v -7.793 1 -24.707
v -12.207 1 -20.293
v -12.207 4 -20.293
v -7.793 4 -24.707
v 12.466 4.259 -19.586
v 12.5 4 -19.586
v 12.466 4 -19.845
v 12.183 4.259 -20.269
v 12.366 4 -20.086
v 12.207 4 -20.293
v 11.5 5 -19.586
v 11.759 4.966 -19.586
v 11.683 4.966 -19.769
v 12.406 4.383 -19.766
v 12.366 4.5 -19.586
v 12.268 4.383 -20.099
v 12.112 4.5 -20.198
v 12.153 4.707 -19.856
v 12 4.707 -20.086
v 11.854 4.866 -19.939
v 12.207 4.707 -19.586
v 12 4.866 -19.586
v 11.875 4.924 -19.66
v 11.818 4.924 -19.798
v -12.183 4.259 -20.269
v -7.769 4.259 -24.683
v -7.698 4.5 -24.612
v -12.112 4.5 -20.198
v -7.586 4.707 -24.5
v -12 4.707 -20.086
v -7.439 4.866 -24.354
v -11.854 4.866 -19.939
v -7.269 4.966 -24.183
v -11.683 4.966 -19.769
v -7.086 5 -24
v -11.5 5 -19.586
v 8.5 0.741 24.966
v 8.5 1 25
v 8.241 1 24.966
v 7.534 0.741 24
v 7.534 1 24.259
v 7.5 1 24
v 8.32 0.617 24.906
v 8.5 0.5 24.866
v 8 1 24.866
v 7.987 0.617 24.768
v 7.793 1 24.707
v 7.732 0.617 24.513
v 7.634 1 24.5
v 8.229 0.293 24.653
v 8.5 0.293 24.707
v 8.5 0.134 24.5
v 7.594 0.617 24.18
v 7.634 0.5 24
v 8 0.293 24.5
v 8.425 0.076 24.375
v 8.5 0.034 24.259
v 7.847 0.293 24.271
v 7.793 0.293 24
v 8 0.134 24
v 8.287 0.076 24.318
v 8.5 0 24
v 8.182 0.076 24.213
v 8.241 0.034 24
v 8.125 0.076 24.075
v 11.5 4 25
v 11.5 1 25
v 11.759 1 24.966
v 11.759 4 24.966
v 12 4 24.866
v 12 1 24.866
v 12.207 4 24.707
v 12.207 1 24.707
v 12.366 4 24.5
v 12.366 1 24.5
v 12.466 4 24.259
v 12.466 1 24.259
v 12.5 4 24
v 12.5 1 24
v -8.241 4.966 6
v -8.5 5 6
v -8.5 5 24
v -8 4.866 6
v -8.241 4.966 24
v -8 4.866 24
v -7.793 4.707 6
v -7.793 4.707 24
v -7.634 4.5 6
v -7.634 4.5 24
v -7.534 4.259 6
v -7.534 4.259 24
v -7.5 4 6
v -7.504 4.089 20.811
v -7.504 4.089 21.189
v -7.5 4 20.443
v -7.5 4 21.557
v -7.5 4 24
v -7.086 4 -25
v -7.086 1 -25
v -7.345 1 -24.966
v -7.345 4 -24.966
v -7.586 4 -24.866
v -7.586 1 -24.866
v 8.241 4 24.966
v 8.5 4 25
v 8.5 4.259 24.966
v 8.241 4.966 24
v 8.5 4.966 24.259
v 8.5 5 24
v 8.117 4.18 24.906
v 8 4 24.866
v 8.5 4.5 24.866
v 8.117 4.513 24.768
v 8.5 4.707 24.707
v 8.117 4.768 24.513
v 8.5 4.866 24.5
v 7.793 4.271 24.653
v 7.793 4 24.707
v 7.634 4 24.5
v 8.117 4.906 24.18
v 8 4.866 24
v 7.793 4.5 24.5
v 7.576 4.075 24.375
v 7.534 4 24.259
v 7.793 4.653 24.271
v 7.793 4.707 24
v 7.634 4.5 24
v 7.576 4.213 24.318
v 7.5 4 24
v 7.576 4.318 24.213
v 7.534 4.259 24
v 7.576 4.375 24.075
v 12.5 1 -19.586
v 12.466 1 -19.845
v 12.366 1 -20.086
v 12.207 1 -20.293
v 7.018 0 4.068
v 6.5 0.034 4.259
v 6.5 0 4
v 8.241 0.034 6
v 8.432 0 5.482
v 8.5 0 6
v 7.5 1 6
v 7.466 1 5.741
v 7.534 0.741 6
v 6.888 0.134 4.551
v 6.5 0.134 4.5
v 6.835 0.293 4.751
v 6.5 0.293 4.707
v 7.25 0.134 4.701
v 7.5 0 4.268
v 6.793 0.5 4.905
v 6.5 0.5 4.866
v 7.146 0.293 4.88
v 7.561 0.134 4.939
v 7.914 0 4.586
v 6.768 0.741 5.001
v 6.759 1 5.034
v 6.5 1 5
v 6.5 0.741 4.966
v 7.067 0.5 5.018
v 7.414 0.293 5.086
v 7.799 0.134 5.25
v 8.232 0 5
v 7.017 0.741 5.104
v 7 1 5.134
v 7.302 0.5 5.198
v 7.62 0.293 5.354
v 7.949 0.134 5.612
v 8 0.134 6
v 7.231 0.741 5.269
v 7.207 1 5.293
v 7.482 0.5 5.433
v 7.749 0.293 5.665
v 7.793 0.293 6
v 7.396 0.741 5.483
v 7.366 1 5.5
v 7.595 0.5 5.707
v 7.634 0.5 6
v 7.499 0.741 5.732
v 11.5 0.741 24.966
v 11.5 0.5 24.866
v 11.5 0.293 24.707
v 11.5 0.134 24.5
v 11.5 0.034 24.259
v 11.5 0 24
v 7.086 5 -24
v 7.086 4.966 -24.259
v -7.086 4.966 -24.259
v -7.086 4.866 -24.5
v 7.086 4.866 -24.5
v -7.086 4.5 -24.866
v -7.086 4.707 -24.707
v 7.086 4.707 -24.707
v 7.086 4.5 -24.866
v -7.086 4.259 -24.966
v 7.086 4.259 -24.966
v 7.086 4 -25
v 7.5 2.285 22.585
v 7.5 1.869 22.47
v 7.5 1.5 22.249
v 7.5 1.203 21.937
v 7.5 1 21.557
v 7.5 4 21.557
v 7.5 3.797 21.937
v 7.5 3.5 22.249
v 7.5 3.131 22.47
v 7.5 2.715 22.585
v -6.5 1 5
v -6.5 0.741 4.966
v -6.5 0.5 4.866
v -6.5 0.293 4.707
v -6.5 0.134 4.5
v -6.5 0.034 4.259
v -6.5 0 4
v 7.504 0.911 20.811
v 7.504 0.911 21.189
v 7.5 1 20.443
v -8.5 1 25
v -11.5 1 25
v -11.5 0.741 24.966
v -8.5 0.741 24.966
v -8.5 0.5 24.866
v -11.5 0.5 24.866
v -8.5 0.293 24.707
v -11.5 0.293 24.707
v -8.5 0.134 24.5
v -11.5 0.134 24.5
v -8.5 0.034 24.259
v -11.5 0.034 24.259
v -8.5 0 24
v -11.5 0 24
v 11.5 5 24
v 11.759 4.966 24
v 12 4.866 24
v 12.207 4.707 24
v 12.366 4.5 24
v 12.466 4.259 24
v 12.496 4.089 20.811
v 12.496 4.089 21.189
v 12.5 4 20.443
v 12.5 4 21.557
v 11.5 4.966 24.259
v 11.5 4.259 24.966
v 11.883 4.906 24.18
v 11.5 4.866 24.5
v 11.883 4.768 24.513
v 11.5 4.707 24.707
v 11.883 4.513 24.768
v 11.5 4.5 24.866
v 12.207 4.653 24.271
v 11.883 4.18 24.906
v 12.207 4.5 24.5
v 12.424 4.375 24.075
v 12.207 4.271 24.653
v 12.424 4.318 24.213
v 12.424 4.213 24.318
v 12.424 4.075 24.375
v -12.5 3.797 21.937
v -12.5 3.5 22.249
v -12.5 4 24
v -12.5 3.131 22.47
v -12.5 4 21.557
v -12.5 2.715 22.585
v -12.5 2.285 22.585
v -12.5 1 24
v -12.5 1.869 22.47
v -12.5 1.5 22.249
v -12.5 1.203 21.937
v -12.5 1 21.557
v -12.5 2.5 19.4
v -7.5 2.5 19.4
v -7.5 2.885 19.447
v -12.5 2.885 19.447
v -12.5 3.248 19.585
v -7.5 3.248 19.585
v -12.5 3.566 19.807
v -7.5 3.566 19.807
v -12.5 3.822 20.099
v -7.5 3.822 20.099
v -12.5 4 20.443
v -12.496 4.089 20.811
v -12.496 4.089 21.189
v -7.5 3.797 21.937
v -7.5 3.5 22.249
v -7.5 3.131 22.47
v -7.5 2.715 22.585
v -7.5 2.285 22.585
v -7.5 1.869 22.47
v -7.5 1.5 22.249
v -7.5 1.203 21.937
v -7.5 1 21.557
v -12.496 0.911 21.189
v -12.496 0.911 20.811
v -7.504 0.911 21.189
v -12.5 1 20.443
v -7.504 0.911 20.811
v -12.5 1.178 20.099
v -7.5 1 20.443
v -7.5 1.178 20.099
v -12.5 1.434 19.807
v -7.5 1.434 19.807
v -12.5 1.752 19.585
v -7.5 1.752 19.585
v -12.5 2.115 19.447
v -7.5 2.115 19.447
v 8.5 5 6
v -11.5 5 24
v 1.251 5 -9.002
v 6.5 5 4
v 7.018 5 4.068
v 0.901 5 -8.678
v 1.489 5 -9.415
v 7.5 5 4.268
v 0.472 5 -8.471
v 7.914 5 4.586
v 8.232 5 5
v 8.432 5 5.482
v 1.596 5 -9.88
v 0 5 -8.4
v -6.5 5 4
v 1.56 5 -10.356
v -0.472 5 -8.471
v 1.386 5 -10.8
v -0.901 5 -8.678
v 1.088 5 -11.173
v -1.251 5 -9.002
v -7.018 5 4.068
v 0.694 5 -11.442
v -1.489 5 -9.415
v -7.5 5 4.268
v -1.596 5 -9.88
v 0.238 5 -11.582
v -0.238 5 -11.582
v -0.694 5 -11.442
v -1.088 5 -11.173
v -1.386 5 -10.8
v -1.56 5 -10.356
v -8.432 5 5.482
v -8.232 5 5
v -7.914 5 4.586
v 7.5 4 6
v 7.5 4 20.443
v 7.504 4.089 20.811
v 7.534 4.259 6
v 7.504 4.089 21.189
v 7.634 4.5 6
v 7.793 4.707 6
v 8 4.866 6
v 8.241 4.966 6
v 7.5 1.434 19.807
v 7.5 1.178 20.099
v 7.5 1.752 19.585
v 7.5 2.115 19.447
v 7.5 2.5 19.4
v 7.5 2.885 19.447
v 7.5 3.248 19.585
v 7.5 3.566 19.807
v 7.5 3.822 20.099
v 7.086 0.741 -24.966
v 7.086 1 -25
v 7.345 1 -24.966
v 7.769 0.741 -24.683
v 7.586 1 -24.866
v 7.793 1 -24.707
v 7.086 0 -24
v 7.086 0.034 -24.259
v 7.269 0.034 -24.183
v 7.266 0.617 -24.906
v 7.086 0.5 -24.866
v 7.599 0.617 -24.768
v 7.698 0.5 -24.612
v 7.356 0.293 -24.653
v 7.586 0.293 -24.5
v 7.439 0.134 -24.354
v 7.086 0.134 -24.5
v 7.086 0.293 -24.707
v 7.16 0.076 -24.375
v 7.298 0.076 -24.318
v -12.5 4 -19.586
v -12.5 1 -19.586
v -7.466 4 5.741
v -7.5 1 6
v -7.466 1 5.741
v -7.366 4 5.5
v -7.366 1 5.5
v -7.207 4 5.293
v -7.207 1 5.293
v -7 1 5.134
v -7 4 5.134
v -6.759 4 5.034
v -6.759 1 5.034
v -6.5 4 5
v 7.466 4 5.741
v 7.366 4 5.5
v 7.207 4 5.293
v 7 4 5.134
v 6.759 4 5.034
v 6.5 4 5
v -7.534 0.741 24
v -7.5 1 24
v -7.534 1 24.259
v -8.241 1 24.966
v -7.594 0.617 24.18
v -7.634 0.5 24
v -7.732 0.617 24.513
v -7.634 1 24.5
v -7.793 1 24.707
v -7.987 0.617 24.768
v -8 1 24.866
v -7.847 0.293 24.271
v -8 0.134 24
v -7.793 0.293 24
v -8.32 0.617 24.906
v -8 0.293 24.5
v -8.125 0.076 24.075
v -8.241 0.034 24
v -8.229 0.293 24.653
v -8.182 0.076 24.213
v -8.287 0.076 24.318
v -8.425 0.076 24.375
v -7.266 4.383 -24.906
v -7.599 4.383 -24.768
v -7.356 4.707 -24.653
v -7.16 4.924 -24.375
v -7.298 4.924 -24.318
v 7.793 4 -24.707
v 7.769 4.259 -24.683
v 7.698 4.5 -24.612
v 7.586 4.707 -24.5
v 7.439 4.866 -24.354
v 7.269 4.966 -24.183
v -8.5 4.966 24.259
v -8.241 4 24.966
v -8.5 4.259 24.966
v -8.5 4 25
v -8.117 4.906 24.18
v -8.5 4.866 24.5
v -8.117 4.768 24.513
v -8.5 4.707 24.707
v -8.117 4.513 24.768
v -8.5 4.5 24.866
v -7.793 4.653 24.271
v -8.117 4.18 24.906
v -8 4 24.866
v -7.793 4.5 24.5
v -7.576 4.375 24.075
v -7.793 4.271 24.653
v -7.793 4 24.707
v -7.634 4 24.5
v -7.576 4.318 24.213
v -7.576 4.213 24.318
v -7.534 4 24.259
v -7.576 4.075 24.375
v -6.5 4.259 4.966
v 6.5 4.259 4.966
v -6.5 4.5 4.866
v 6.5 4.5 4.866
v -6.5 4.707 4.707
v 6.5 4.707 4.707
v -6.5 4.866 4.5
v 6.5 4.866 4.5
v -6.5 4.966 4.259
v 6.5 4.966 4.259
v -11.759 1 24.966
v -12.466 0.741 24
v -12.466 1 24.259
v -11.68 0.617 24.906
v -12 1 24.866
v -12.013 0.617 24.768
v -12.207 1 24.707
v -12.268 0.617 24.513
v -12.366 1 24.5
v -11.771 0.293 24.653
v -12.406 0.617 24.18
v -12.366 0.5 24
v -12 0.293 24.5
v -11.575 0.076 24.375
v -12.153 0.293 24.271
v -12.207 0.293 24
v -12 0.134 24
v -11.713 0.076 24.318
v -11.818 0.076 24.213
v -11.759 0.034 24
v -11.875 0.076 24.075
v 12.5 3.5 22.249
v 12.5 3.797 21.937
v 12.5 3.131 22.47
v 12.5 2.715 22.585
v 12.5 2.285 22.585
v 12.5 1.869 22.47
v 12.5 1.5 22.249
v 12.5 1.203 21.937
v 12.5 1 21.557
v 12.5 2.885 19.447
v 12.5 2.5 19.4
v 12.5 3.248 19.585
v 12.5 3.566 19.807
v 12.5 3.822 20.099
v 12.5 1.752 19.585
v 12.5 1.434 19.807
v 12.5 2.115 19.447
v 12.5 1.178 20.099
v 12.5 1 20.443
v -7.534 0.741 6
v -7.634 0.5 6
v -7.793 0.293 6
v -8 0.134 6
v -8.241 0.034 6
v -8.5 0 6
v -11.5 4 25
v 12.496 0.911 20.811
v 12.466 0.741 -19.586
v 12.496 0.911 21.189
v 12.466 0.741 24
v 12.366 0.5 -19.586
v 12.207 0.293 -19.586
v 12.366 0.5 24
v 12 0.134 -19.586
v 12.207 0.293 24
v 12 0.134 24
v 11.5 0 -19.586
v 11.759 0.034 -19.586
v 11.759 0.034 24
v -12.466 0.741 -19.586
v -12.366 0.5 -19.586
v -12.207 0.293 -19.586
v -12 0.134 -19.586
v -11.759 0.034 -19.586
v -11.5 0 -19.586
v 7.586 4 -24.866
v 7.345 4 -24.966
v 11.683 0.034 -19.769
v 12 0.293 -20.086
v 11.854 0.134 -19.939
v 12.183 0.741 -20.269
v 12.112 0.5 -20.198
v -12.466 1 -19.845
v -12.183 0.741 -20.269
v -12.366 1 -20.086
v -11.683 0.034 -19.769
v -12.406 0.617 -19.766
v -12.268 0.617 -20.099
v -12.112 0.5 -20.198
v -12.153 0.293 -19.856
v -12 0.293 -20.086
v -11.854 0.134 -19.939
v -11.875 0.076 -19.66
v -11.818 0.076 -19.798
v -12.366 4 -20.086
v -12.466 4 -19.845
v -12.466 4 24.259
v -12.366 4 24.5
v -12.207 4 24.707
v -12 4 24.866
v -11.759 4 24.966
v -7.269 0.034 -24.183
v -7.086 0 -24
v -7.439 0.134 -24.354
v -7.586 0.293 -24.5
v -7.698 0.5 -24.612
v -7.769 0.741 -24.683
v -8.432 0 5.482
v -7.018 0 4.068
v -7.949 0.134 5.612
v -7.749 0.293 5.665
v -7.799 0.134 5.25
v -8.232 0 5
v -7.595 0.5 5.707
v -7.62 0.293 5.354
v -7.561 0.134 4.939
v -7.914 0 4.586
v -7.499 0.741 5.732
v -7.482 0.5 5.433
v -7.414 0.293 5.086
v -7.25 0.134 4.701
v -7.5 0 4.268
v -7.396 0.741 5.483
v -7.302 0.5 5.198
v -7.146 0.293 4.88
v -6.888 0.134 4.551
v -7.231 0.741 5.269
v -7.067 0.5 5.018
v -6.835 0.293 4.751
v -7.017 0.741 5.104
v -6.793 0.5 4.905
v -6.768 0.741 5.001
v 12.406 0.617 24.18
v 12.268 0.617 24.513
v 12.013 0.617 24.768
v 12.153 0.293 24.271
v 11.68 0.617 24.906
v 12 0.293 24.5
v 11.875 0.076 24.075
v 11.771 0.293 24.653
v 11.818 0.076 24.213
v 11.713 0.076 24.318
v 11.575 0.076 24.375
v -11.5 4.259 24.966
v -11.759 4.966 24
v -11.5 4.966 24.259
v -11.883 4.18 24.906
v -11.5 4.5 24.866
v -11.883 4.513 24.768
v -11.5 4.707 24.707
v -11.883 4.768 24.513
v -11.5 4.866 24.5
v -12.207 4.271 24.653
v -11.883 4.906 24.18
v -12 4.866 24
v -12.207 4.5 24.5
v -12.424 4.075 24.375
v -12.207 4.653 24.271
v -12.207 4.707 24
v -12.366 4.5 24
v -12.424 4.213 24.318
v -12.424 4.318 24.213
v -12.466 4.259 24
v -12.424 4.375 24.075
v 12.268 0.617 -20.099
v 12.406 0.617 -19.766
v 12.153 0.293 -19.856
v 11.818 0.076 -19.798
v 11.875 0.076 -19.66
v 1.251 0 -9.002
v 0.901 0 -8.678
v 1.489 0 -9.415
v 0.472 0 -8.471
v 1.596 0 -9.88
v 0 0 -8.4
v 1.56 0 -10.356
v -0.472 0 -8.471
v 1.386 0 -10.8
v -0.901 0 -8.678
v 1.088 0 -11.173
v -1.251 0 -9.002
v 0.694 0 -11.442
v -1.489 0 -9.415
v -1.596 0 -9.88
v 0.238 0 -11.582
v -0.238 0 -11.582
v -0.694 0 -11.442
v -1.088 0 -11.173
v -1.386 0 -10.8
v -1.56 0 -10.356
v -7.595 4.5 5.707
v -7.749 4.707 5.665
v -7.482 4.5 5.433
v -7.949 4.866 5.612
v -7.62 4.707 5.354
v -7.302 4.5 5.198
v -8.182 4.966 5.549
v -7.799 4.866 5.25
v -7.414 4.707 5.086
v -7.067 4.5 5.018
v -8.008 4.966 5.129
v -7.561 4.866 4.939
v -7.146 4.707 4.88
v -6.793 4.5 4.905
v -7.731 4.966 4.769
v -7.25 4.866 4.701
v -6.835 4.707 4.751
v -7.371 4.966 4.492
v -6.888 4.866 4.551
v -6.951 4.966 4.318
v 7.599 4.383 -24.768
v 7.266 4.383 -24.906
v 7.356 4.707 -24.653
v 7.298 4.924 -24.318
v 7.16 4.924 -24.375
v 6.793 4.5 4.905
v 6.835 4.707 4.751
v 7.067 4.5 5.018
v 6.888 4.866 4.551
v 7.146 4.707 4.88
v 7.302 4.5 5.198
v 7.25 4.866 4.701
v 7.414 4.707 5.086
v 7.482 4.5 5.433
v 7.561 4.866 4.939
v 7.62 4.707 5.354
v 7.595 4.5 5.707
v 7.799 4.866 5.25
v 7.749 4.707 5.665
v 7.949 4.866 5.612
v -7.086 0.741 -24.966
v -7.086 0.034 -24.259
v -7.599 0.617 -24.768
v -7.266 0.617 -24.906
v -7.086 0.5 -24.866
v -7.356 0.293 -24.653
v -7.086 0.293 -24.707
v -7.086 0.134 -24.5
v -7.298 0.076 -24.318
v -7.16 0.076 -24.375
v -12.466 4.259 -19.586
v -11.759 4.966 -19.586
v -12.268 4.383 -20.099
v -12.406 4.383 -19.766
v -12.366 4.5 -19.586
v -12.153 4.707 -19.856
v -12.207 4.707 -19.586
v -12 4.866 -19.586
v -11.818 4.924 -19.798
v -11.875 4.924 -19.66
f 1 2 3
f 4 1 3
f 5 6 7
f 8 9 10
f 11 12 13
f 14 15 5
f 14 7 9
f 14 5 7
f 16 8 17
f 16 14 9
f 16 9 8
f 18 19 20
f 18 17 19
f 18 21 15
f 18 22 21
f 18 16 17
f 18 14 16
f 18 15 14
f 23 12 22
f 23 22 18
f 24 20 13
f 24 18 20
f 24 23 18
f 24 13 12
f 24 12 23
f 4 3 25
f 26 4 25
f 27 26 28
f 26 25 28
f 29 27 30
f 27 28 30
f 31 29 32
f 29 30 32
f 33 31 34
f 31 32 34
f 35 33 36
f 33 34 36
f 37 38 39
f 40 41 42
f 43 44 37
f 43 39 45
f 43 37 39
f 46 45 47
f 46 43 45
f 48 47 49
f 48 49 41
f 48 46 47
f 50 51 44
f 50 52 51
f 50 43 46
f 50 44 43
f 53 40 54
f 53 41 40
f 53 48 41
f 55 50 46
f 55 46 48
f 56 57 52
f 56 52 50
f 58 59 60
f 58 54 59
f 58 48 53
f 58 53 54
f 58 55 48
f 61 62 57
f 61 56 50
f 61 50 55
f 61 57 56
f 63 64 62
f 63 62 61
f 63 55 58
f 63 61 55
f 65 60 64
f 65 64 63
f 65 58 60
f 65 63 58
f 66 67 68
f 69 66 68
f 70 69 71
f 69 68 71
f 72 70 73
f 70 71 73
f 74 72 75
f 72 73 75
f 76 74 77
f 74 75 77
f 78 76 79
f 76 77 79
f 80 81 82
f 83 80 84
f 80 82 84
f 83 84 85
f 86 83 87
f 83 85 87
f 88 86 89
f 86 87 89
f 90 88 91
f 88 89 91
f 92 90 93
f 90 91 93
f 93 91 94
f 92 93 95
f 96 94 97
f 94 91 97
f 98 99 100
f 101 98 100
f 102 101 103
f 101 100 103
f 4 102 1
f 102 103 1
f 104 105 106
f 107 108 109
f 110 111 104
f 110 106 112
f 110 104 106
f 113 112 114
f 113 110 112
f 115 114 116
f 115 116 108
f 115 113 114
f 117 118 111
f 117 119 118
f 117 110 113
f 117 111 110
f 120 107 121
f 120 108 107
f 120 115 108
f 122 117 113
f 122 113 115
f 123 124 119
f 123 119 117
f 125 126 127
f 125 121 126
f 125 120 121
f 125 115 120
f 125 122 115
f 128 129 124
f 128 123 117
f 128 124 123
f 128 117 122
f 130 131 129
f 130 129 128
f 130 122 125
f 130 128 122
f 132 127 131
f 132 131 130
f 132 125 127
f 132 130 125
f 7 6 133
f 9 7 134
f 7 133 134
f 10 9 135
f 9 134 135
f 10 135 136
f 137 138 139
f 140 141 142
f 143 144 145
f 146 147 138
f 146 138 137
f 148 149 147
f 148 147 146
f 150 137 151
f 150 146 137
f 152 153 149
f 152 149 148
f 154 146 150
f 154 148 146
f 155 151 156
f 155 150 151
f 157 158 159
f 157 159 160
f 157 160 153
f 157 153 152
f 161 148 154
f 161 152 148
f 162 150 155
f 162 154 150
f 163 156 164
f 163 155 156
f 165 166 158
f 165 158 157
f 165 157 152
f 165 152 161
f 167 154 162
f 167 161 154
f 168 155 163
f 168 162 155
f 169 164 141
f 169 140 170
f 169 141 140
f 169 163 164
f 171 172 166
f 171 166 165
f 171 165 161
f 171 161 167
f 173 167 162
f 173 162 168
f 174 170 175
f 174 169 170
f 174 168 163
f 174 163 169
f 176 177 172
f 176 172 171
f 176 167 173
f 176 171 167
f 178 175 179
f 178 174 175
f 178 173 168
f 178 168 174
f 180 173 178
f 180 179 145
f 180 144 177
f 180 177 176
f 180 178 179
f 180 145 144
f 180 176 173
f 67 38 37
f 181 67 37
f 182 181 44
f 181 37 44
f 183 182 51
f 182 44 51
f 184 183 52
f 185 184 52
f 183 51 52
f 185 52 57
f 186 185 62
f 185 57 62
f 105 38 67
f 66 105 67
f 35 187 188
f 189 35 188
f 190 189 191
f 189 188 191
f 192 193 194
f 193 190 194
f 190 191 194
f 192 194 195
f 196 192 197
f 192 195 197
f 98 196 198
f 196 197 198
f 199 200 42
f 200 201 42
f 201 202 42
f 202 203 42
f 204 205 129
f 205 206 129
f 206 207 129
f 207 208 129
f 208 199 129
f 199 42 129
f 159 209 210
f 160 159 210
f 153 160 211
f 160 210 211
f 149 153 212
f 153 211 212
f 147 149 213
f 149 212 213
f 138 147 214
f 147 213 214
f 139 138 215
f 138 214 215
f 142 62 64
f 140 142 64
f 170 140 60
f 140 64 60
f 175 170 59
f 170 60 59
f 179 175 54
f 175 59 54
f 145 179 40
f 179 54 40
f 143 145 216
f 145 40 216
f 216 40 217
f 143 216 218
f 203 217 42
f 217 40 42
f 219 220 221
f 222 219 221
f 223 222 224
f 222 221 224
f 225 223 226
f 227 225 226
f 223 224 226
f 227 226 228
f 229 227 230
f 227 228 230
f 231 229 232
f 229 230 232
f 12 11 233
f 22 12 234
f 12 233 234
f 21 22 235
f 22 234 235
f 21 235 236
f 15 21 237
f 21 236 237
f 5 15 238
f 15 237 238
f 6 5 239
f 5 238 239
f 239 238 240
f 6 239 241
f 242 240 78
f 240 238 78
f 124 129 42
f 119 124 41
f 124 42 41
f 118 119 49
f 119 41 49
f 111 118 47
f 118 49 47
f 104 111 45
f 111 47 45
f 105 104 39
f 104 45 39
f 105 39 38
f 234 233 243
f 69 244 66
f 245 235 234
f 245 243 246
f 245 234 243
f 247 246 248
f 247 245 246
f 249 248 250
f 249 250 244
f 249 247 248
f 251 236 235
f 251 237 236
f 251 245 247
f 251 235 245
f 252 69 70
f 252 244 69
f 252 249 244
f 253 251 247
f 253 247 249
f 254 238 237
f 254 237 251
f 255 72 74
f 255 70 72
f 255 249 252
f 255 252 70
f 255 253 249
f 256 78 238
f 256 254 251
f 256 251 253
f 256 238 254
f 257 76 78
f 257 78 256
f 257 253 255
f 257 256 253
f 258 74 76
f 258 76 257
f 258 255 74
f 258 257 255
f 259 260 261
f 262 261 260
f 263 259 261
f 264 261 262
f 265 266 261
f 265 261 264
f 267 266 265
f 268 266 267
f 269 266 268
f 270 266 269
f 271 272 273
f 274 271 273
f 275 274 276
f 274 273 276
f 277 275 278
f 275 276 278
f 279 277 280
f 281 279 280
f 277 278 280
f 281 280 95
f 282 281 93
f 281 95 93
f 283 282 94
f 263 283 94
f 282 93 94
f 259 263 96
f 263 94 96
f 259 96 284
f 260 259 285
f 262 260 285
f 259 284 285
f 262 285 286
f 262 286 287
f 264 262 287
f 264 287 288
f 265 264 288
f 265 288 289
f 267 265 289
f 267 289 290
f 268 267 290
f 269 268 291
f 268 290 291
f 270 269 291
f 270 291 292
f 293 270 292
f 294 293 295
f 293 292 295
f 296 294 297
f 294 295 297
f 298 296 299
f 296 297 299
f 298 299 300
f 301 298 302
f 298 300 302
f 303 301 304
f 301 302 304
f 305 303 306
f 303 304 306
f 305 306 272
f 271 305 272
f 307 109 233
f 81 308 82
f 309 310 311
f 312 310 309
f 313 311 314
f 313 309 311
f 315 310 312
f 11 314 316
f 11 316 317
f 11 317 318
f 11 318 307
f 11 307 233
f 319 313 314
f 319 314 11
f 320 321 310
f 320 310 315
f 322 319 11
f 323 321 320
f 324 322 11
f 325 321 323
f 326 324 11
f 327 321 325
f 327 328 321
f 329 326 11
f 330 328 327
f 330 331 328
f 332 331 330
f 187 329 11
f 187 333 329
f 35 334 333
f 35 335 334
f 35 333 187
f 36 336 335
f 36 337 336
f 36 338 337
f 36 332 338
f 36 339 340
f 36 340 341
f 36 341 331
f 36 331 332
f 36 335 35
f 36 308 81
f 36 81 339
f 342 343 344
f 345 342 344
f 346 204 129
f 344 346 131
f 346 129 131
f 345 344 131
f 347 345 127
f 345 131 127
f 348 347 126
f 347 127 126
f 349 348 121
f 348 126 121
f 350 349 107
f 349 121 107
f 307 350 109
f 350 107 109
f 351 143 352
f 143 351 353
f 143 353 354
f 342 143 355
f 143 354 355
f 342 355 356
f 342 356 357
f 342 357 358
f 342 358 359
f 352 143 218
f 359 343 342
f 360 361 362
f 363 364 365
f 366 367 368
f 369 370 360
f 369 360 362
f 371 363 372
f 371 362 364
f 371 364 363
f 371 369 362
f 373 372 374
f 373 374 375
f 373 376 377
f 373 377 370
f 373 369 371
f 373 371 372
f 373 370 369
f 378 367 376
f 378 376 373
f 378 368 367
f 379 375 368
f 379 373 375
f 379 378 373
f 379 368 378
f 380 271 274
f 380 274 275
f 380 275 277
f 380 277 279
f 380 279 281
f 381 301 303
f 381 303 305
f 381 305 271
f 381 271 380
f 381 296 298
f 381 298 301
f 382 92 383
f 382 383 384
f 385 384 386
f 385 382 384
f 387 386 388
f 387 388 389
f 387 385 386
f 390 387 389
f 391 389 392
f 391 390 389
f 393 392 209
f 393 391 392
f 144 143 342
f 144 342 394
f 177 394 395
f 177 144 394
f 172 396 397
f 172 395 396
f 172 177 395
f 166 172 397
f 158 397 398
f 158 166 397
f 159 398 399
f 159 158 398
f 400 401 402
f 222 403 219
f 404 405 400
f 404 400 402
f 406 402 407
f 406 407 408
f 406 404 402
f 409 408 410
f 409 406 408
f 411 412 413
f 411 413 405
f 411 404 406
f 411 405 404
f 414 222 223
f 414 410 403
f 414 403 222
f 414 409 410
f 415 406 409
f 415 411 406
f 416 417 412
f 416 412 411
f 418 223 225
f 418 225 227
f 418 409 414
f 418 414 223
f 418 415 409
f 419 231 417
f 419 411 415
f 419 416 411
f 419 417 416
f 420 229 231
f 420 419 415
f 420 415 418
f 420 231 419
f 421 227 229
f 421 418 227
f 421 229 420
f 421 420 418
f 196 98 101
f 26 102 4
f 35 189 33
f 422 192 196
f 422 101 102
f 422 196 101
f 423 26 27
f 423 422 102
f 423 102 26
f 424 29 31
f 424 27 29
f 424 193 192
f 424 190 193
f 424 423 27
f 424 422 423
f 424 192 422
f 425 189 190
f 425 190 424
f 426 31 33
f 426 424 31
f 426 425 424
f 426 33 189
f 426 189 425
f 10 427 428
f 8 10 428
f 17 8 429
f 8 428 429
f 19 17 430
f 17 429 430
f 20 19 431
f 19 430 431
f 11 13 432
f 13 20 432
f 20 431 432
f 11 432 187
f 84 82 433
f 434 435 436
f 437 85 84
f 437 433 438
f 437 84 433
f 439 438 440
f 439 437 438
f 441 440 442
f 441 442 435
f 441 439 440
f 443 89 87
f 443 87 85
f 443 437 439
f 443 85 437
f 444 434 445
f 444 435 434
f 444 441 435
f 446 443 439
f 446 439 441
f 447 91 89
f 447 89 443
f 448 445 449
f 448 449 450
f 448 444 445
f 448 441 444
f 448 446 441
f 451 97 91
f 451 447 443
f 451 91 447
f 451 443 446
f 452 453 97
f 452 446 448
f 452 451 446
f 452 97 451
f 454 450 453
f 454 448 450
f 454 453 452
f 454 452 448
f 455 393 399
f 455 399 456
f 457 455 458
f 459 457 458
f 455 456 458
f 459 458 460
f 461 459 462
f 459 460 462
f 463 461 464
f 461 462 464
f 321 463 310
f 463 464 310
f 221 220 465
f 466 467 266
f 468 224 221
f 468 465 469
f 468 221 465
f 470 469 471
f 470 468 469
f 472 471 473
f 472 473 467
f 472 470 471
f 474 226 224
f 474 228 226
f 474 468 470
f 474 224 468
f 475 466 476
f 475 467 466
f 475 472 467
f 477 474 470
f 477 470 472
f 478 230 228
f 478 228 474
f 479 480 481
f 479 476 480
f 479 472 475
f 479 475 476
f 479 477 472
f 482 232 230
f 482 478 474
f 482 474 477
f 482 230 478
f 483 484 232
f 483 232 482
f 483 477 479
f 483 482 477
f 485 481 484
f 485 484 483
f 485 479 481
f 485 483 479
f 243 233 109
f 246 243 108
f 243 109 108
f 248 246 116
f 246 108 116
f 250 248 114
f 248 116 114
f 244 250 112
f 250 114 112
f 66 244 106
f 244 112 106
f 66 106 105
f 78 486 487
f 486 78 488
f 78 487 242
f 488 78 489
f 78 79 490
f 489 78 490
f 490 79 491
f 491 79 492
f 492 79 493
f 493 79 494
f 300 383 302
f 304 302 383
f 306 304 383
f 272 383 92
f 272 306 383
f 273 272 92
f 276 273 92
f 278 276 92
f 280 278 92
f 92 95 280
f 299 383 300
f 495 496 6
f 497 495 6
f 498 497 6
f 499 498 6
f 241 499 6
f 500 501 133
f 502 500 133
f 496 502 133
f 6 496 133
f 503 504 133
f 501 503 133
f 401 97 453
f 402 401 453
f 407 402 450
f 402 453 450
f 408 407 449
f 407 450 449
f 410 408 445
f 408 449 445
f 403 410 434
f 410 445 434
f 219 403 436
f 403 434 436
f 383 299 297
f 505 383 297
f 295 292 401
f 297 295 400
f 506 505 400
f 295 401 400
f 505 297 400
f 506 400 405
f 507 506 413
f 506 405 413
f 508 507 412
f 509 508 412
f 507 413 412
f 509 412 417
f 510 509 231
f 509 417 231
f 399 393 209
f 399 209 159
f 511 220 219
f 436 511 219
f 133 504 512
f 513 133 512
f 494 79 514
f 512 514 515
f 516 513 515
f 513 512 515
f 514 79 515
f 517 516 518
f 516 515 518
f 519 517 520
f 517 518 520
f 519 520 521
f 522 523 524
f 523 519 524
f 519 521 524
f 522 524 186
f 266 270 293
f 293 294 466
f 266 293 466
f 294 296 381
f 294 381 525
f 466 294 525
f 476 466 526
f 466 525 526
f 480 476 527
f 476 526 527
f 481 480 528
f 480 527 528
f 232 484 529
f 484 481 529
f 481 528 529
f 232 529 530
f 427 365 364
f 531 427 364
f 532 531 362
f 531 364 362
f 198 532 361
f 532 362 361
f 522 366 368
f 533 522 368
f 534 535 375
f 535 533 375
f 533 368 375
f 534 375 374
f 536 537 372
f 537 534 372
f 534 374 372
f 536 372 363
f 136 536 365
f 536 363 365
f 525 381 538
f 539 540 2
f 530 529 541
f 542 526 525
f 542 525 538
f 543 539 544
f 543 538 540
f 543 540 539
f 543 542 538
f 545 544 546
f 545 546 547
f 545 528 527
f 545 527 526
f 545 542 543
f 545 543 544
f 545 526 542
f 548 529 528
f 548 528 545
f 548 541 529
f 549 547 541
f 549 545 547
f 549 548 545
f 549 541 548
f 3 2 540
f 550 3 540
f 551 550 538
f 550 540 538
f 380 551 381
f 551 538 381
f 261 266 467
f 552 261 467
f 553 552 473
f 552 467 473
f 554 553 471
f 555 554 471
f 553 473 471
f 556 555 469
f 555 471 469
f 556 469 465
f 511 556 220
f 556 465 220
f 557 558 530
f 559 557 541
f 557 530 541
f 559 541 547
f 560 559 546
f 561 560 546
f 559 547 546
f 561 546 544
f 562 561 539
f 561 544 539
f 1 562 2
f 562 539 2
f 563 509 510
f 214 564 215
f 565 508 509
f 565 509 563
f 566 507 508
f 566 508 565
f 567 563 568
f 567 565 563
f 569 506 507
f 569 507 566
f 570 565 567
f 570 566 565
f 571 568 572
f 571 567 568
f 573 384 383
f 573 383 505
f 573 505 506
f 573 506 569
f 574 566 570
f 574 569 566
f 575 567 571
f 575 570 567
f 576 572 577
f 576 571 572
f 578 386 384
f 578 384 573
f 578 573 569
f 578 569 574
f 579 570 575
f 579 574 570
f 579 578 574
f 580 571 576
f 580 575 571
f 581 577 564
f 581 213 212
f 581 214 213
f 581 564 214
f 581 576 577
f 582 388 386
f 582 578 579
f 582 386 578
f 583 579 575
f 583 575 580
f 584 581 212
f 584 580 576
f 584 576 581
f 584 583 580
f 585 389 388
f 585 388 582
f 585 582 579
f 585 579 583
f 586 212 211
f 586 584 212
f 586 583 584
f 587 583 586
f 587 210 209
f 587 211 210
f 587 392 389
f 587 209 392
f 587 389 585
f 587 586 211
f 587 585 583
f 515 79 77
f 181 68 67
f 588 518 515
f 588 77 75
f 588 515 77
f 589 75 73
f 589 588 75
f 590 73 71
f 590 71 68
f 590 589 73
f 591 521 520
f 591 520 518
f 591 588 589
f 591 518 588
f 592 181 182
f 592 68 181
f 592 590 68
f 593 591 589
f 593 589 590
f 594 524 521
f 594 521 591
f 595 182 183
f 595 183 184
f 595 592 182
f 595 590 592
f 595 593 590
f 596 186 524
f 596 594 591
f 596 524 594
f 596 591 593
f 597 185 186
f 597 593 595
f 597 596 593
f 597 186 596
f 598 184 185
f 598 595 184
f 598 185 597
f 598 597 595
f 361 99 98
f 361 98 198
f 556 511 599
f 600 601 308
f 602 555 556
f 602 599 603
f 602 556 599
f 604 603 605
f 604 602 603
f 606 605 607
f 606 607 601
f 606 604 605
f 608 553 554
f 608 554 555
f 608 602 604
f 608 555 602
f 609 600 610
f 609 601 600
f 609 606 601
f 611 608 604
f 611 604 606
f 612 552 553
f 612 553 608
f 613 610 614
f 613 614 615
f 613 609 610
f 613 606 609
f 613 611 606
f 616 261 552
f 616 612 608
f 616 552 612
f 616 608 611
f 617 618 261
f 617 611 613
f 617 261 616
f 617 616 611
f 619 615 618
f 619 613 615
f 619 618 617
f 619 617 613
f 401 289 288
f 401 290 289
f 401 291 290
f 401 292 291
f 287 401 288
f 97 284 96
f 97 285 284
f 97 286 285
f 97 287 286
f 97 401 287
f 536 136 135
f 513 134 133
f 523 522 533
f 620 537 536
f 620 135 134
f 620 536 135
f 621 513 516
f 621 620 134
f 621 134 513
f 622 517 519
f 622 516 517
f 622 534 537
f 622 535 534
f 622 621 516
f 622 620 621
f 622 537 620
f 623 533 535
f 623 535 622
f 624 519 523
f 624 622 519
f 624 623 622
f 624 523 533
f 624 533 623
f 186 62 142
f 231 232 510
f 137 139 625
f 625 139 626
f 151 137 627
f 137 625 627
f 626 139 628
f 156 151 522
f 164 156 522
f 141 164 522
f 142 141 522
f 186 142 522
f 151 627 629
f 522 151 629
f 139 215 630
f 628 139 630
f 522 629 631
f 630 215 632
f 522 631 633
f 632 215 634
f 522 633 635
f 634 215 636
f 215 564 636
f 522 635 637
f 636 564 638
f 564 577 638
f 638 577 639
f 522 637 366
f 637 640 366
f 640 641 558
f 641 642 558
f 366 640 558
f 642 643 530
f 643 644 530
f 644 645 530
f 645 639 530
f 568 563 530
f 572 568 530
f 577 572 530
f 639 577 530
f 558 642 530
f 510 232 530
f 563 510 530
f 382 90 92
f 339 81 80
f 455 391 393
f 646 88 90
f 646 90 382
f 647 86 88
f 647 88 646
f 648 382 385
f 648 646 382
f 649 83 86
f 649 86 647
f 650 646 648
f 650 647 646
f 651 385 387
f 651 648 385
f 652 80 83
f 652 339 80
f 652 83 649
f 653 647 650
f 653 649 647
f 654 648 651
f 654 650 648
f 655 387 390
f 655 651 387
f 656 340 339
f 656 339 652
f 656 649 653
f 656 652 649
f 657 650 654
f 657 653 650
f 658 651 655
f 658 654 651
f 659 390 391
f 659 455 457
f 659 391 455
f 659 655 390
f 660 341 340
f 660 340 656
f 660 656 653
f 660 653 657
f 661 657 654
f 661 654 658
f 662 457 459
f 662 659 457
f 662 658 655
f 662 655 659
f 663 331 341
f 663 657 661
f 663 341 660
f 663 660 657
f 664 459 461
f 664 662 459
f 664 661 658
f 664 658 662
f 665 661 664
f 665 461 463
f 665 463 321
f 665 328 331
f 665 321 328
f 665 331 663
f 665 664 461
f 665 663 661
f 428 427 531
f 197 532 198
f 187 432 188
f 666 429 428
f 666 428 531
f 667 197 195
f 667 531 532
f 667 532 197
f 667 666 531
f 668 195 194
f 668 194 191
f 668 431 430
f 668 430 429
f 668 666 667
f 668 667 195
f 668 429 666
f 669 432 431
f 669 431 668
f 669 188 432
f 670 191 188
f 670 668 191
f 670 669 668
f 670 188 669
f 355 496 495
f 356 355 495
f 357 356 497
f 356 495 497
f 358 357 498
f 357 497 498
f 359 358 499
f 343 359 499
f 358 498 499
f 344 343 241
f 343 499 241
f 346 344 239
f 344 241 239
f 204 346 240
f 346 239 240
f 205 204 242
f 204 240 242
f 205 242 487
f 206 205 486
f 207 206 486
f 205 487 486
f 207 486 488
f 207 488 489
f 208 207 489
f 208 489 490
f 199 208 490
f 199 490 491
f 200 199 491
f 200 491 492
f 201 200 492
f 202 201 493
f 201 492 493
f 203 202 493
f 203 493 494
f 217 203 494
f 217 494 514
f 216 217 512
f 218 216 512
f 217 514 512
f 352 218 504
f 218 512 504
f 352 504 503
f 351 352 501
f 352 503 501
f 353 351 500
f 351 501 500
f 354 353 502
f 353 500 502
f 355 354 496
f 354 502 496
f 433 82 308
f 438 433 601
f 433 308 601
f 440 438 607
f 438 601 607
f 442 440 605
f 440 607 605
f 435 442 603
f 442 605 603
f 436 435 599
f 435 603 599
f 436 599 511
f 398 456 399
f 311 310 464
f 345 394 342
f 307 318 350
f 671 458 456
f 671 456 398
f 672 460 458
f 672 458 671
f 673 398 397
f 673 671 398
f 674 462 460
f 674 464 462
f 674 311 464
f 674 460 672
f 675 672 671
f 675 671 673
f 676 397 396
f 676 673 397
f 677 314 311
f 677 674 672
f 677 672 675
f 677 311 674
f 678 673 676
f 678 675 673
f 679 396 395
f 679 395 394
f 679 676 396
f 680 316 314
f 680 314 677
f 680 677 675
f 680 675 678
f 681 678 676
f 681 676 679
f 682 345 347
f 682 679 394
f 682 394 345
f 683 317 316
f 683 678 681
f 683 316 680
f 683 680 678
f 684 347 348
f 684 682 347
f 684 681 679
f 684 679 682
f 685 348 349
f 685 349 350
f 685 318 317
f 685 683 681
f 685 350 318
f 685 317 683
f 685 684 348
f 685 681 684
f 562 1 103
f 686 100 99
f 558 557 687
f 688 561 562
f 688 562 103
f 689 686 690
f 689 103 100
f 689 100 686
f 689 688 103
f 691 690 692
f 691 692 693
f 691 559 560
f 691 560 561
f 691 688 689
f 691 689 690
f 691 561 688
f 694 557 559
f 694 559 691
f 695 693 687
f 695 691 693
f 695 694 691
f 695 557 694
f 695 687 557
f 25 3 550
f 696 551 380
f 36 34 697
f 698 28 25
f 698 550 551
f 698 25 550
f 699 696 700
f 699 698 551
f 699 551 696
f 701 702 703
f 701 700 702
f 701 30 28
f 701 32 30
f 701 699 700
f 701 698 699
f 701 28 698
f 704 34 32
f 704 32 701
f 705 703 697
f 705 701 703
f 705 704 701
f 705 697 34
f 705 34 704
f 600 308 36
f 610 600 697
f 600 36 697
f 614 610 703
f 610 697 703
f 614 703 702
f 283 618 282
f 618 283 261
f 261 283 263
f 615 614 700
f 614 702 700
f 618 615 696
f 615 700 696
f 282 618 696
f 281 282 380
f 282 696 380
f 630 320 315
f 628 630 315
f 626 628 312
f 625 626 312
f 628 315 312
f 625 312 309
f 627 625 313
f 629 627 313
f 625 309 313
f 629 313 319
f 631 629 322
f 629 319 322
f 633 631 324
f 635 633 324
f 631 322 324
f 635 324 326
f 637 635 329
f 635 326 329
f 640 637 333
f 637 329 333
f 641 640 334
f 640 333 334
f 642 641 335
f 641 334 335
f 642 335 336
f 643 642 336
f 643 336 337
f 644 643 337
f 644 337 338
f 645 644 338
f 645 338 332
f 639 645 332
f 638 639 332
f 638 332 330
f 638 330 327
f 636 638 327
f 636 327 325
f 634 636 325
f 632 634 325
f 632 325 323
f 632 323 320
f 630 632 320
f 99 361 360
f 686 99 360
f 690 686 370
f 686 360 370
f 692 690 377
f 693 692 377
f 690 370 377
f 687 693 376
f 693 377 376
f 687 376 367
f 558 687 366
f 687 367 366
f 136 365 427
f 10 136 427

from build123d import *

# Parameters (mm, degrees)
SKETCH1_W           = 25
SKETCH1_H           = 50
BOSS_EXTRUDE1_DEPTH = 5
SKETCH3_W           = 15
SKETCH3_H           = 5
CUT_EXTRUDE1_DEPTH  = 20
SKETCH5_R           = 1.6
CUT_EXTRUDE4_DEPTH  = 48.5
SKETCH6_R           = 1.6
CUT_EXTRUDE5_DEPTH  = 48.5
CHAMFER1_SIZE       = 5
FILLET1_R           = 1


with BuildPart() as part:
    # Sketch1 → Boss-Extrude1 (new body)
    with BuildSketch(Plane(origin=(0, 0, 0), x_dir=(1, 0, 0), z_dir=(0, 1, 0))):
        Rectangle(SKETCH1_W, SKETCH1_H)
    extrude(amount=BOSS_EXTRUDE1_DEPTH)

    # Sketch3 → Cut-Extrude1 (cut)
    with BuildSketch(Plane.XY.offset(25)):
        with Locations((0, 2.5)):
            Rectangle(SKETCH3_W, SKETCH3_H)
    extrude(amount=-CUT_EXTRUDE1_DEPTH, mode=Mode.SUBTRACT)

    # Sketch5 → Cut-Extrude4 (cut)
    with BuildSketch(Plane(origin=(12.5, 0, 0), x_dir=(0, 0, -1), z_dir=(1, 0, 0))):
        with Locations((-21, 2.5)):
            Circle(SKETCH5_R)
    extrude(amount=-CUT_EXTRUDE4_DEPTH, mode=Mode.SUBTRACT)

    # Sketch6 → Cut-Extrude5 (cut)
    with BuildSketch(Plane(origin=(0, 5, 0), x_dir=(1, 0, 0), z_dir=(0, 1, 0))):
        with Locations(Location((0, 10, 0), (0, 0, 270))):
            Circle(SKETCH6_R)
    extrude(amount=-CUT_EXTRUDE5_DEPTH, mode=Mode.SUBTRACT)

    # Chamfer1
    chamfer1_edges = [part.edges().sort_by_distance(p)[0] for p in [
        (-12.5, 2.5, -25),
        (12.5, 2.5, -25),
    ]]
    chamfer(chamfer1_edges, length=CHAMFER1_SIZE)

    # Fillet1
    # the kernel refuses this fillet: 1 mm, written as the material it adds along each edge
    with BuildSketch(Plane(origin=(7.5, 0, 5), x_dir=(-1, 0, 0), z_dir=(0, 1, 0))) as fillet1_piece_1:
        with BuildLine():
            CenterArc((FILLET1_R, FILLET1_R), FILLET1_R, 180, 90)
            Line((0, FILLET1_R), (0, 0))
            Line((0, 0), (FILLET1_R, 0))
        make_face()
    extrude(amount=5)
    with BuildSketch(Plane(origin=(-7.5, 5, 5), x_dir=(0, 0, 1), z_dir=(0, -1, 0))) as fillet1_piece_2:
        with BuildLine():
            CenterArc((FILLET1_R, -FILLET1_R), FILLET1_R, 90, 90)
            Line((0, -FILLET1_R), (0, 0))
            Line((0, 0), (FILLET1_R, 0))
        make_face()
    extrude(amount=5)
    # the kernel refuses this fillet: 1 mm, written as the material it takes off along each edge
    with BuildSketch(Plane(origin=(11.5, 1, 24), x_dir=(1, 0, 0), z_dir=(0, -1, 0))) as fillet1_2_piece_1_section:
        Polygon((0, 0), (FILLET1_R, 0), (FILLET1_R, FILLET1_R), (0, FILLET1_R), align=None)
    fillet1_2_piece_1 = extrude(amount=FILLET1_R, mode=Mode.PRIVATE)
    fillet1_2_piece_1 = fillet1_2_piece_1 - Plane(origin=(11.5, 1, 24), x_dir=(-0.7071067811865475, 0, -0.7071067811865475), z_dir=(0, -1, 0)) * Sphere(FILLET1_R, mode=Mode.PRIVATE)
    add(fillet1_2_piece_1, mode=Mode.SUBTRACT)
    with BuildSketch(Plane(origin=(-11.5, 4, 24), x_dir=(0, 0, 1), z_dir=(-1, 0, 0))) as fillet1_2_piece_2_section:
        Polygon((0, 0), (FILLET1_R, 0), (FILLET1_R, FILLET1_R), (0, FILLET1_R), align=None)
    fillet1_2_piece_2 = extrude(amount=FILLET1_R, mode=Mode.PRIVATE)
    fillet1_2_piece_2 = fillet1_2_piece_2 - Plane(origin=(-11.5, 4, 24), x_dir=(0, -0.7071067811865475, -0.7071067811865475), z_dir=(-1, 0, 0)) * Sphere(FILLET1_R, mode=Mode.PRIVATE)
    add(fillet1_2_piece_2, mode=Mode.SUBTRACT)
    with BuildSketch(Plane(origin=(11.5, 4, 24), x_dir=(0, 0, 1), z_dir=(1, 0, 0))) as fillet1_2_piece_3_section:
        Polygon((0, 0), (FILLET1_R, 0), (FILLET1_R, -FILLET1_R), (0, -FILLET1_R), align=None)
    fillet1_2_piece_3 = extrude(amount=FILLET1_R, mode=Mode.PRIVATE)
    fillet1_2_piece_3 = fillet1_2_piece_3 - Plane(origin=(11.5, 4, 24), x_dir=(0, -0.7071067811865475, -0.7071067811865475), z_dir=(1, 0, 0)) * Sphere(FILLET1_R, mode=Mode.PRIVATE)
    add(fillet1_2_piece_3, mode=Mode.SUBTRACT)
    with BuildSketch(Plane(origin=(-11.5, 1, -19.585786438), x_dir=(-1, 0, 0), z_dir=(0, -1, 0))) as fillet1_2_piece_4_section:
        Polygon((0, 0), (FILLET1_R, 0), (FILLET1_R, FILLET1_R * 0.414213562373), (FILLET1_R * 0.707106781187, FILLET1_R * 0.707106781187), align=None)
    fillet1_2_piece_4 = extrude(amount=FILLET1_R, mode=Mode.PRIVATE)
    fillet1_2_piece_4 = fillet1_2_piece_4 - Plane(origin=(-11.5, 1, -19.585786438), x_dir=(0.9238795325112867, 0, 0.3826834323650898), z_dir=(0, -1, 0)) * Sphere(FILLET1_R, mode=Mode.PRIVATE)
    add(fillet1_2_piece_4, mode=Mode.SUBTRACT)
    with BuildSketch(Plane(origin=(-11.5, 1, 24), x_dir=(-1, 0, 0), z_dir=(0, -1, 0))) as fillet1_2_piece_5_section:
        Polygon((0, 0), (FILLET1_R, 0), (FILLET1_R, -FILLET1_R), (0, -FILLET1_R), align=None)
    fillet1_2_piece_5 = extrude(amount=FILLET1_R, mode=Mode.PRIVATE)
    fillet1_2_piece_5 = fillet1_2_piece_5 - Plane(origin=(-11.5, 1, 24), x_dir=(0.7071067811865475, 0, -0.7071067811865475), z_dir=(0, -1, 0)) * Sphere(FILLET1_R, mode=Mode.PRIVATE)
    add(fillet1_2_piece_5, mode=Mode.SUBTRACT)
    with BuildSketch(Plane(origin=(-11.5, 4, -19.585786438), x_dir=(-1, 0, 0), z_dir=(0, 1, 0))) as fillet1_2_piece_6_section:
        Polygon((0, 0), (FILLET1_R, 0), (FILLET1_R, -FILLET1_R * 0.414213562373), (FILLET1_R * 0.707106781187, -FILLET1_R * 0.707106781187), align=None)
    fillet1_2_piece_6 = extrude(amount=FILLET1_R, mode=Mode.PRIVATE)
    fillet1_2_piece_6 = fillet1_2_piece_6 - Plane(origin=(-11.5, 4, -19.585786438), x_dir=(0.9238795325112867, 0, 0.3826834323650898), z_dir=(0, 1, 0)) * Sphere(FILLET1_R, mode=Mode.PRIVATE)
    add(fillet1_2_piece_6, mode=Mode.SUBTRACT)
    with BuildSketch(Plane(origin=(7.085786438, 1, -24), x_dir=(0, 0, -1), z_dir=(0, -1, 0))) as fillet1_2_piece_7_section:
        Polygon((0, 0), (FILLET1_R, 0), (FILLET1_R, FILLET1_R * 0.414213562373), (FILLET1_R * 0.707106781187, FILLET1_R * 0.707106781187), align=None)
    fillet1_2_piece_7 = extrude(amount=FILLET1_R, mode=Mode.PRIVATE)
    fillet1_2_piece_7 = fillet1_2_piece_7 - Plane(origin=(7.085786438, 1, -24), x_dir=(-0.3826834323650898, 0, 0.9238795325112867), z_dir=(0, -1, 0)) * Sphere(FILLET1_R, mode=Mode.PRIVATE)
    add(fillet1_2_piece_7, mode=Mode.SUBTRACT)
    with BuildSketch(Plane(origin=(-7.085786438, 1, -24), x_dir=(-0.7071067811865476, 0, -0.7071067811865476), z_dir=(0, -1, 0))) as fillet1_2_piece_8_section:
        Polygon((0, 0), (FILLET1_R, 0), (FILLET1_R, FILLET1_R * 0.414213562373), (FILLET1_R * 0.707106781187, FILLET1_R * 0.707106781187), align=None)
    fillet1_2_piece_8 = extrude(amount=FILLET1_R, mode=Mode.PRIVATE)
    fillet1_2_piece_8 = fillet1_2_piece_8 - Plane(origin=(-7.085786438, 1, -24), x_dir=(0.3826834323650898, 0, 0.9238795325112867), z_dir=(0, -1, 0)) * Sphere(FILLET1_R, mode=Mode.PRIVATE)
    add(fillet1_2_piece_8, mode=Mode.SUBTRACT)
    with BuildSketch(Plane(origin=(11.5, 4, -19.585786438), x_dir=(0.7071067811865476, 0, -0.7071067811865476), z_dir=(0, 1, 0))) as fillet1_2_piece_9_section:
        Polygon((0, 0), (FILLET1_R, 0), (FILLET1_R, -FILLET1_R * 0.414213562373), (FILLET1_R * 0.707106781187, -FILLET1_R * 0.707106781187), align=None)
    fillet1_2_piece_9 = extrude(amount=FILLET1_R, mode=Mode.PRIVATE)
    fillet1_2_piece_9 = fillet1_2_piece_9 - Plane(origin=(11.5, 4, -19.585786438), x_dir=(-0.9238795325112867, 0, 0.3826834323650898), z_dir=(0, 1, 0)) * Sphere(FILLET1_R, mode=Mode.PRIVATE)
    add(fillet1_2_piece_9, mode=Mode.SUBTRACT)
    with BuildSketch(Plane(origin=(11.5, 1, -19.585786438), x_dir=(1, 0, 0), z_dir=(0, -1, 0))) as fillet1_2_piece_10_section:
        Polygon((0, 0), (FILLET1_R, 0), (FILLET1_R, -FILLET1_R * 0.414213562373), (FILLET1_R * 0.707106781187, -FILLET1_R * 0.707106781187), align=None)
    fillet1_2_piece_10 = extrude(amount=FILLET1_R, mode=Mode.PRIVATE)
    fillet1_2_piece_10 = fillet1_2_piece_10 - Plane(origin=(11.5, 1, -19.585786438), x_dir=(-0.9238795325112867, 0, 0.3826834323650898), z_dir=(0, -1, 0)) * Sphere(FILLET1_R, mode=Mode.PRIVATE)
    add(fillet1_2_piece_10, mode=Mode.SUBTRACT)
    with BuildSketch(Plane(origin=(7.085786438, 4, -24), x_dir=(0.7071067811865476, 0, -0.7071067811865476), z_dir=(0, 1, 0))) as fillet1_2_piece_11_section:
        Polygon((0, 0), (FILLET1_R, 0), (FILLET1_R, FILLET1_R * 0.414213562373), (FILLET1_R * 0.707106781187, FILLET1_R * 0.707106781187), align=None)
    fillet1_2_piece_11 = extrude(amount=FILLET1_R, mode=Mode.PRIVATE)
    fillet1_2_piece_11 = fillet1_2_piece_11 - Plane(origin=(7.085786438, 4, -24), x_dir=(-0.3826834323650898, 0, 0.9238795325112867), z_dir=(0, 1, 0)) * Sphere(FILLET1_R, mode=Mode.PRIVATE)
    add(fillet1_2_piece_11, mode=Mode.SUBTRACT)
    with BuildSketch(Plane(origin=(-7.085786438, 4, -24), x_dir=(-0.7071067811865476, 0, -0.7071067811865476), z_dir=(0, 1, 0))) as fillet1_2_piece_12_section:
        Polygon((0, 0), (FILLET1_R, 0), (FILLET1_R, -FILLET1_R * 0.414213562373), (FILLET1_R * 0.707106781187, -FILLET1_R * 0.707106781187), align=None)
    fillet1_2_piece_12 = extrude(amount=FILLET1_R, mode=Mode.PRIVATE)
    fillet1_2_piece_12 = fillet1_2_piece_12 - Plane(origin=(-7.085786438, 4, -24), x_dir=(0.3826834323650898, 0, 0.9238795325112867), z_dir=(0, 1, 0)) * Sphere(FILLET1_R, mode=Mode.PRIVATE)
    add(fillet1_2_piece_12, mode=Mode.SUBTRACT)
    with BuildSketch(Plane(origin=(5, 0, 25), x_dir=(0, 0, -1), z_dir=(1, 0, 0)), Plane(origin=(-11.5, 5, 25), x_dir=(0, -1, 0), z_dir=(1, 0, 0)), Plane(origin=(5, 5, 25), x_dir=(0, -1, 0), z_dir=(1, 0, 0)), Plane(origin=(-11.5, 0, 25), x_dir=(0, 0, -1), z_dir=(1, 0, 0))) as fillet1_2_piece_13:
        with BuildLine():
            CenterArc((FILLET1_R, FILLET1_R), FILLET1_R, 180, 90)
            Line((0, FILLET1_R), (0, 0))
            Line((0, 0), (FILLET1_R, 0))
        make_face()
    extrude(amount=6.5, mode=Mode.SUBTRACT)
    with BuildSketch(Plane(origin=(-7.5, 7.5, 25), x_dir=(-1, 0, 0), z_dir=(0, -1, 0))) as fillet1_2_piece_14:
        with BuildLine():
            CenterArc((FILLET1_R, FILLET1_R), FILLET1_R, 180, 90)
            Line((0, FILLET1_R), (0, 0))
            Line((0, 0), (FILLET1_R, 0))
        make_face()
    extrude(amount=10, mode=Mode.SUBTRACT)
    with BuildSketch(Plane(origin=(7.5, -2.5, 25), x_dir=(0, 0, -1), z_dir=(0, 1, 0))) as fillet1_2_piece_15:
        with BuildLine():
            CenterArc((FILLET1_R, -FILLET1_R), FILLET1_R, 90, 90)
            Line((0, -FILLET1_R), (0, 0))
            Line((0, 0), (FILLET1_R, 0))
        make_face()
    extrude(amount=10, mode=Mode.SUBTRACT)
    with BuildSketch(Plane(origin=(-12.5, 0, -19.585786438), x_dir=(1, 0, 0), z_dir=(0, 0, 1)), Plane(origin=(-12.5, 5, -19.585786438), x_dir=(0, -1, 0), z_dir=(0, 0, 1)), Plane(origin=(12.5, 5, 24), x_dir=(0, -1, 0), z_dir=(0, 0, -1)), Plane(origin=(12.5, 0, 24), x_dir=(-1, 0, 0), z_dir=(0, 0, -1))) as fillet1_2_piece_16:
        with BuildLine():
            CenterArc((FILLET1_R, FILLET1_R), FILLET1_R, 180, 90)
            Line((0, FILLET1_R), (0, 0))
            Line((0, 0), (FILLET1_R, 0))
        make_face()
    extrude(amount=43.585786438, mode=Mode.SUBTRACT)
    with BuildSketch(Plane(origin=(-12.5, 1, -20), x_dir=(0, 0, 1), z_dir=(0, 1, 0)), Plane(origin=(7.5, 1, -25), x_dir=(-1, 0, 0), z_dir=(0, 1, 0)), Plane(origin=(-7.5, 1, -25), x_dir=(-0.7071067811865486, 0, 0.7071067811865465), z_dir=(0, 1, 0)), Plane(origin=(12.5, 1, -20), x_dir=(-0.7071067811865475, 0, -0.7071067811865475), z_dir=(0, 1, 0))) as fillet1_2_piece_17:
        with BuildLine():
            CenterArc((FILLET1_R * 0.414213562373, FILLET1_R), FILLET1_R, 225, 45)
            Line((-FILLET1_R * 0.292893218813, FILLET1_R * 0.292893218813), (0, 0))
            Line((0, 0), (FILLET1_R * 0.414213562373, 0))
        make_face()
    extrude(amount=3, mode=Mode.SUBTRACT)
    with BuildSketch(Plane(origin=(7.085786438, 0, -25), x_dir=(0, 0, 1), z_dir=(-1, 0, 0)), Plane(origin=(7.085786438, 5, -25), x_dir=(0, -1, 0), z_dir=(-1, 0, 0))) as fillet1_2_piece_18:
        with BuildLine():
            CenterArc((FILLET1_R, FILLET1_R), FILLET1_R, 180, 90)
            Line((0, FILLET1_R), (0, 0))
            Line((0, 0), (FILLET1_R, 0))
        make_face()
    extrude(amount=14.171572875, mode=Mode.SUBTRACT)
    with BuildSketch(Plane(origin=(7.792893219, 0, -24.707106781), x_dir=(-0.7071067811865475, 0, 0.7071067811865475), z_dir=(0.7071067811865476, 0, 0.7071067811865476)), Plane(origin=(-12.207106781, 0, -20.292893219), x_dir=(0.7071067811865476, 0, 0.7071067811865476), z_dir=(0.7071067811865476, 0, -0.7071067811865476)), Plane(origin=(7.792893219, 5, -24.707106781), x_dir=(0, -1, 0), z_dir=(0.7071067811865476, 0, 0.7071067811865476)), Plane(origin=(-12.207106781, 5, -20.292893219), x_dir=(0, -1, 0), z_dir=(0.7071067811865476, 0, -0.7071067811865476))) as fillet1_2_piece_19:
        with BuildLine():
            CenterArc((FILLET1_R, -FILLET1_R), FILLET1_R, 90, 90)
            Line((0, -FILLET1_R), (0, 0))
            Line((0, 0), (FILLET1_R, 0))
        make_face()
    extrude(amount=6.242640687, mode=Mode.SUBTRACT)
    with BuildSketch(Plane(origin=(12.5, 1, 25), x_dir=(0, 0, -1), z_dir=(0, 1, 0))) as fillet1_2_piece_20:
        with BuildLine():
            CenterArc((FILLET1_R, FILLET1_R), FILLET1_R, 180, 90)
            Line((0, FILLET1_R), (0, 0))
            Line((0, 0), (FILLET1_R, 0))
        make_face()
    extrude(amount=3, mode=Mode.SUBTRACT)
    with BuildSketch(Plane(origin=(-12.5, 1, 25), x_dir=(0, 0, -1), z_dir=(0, 1, 0))) as fillet1_2_piece_21:
        with BuildLine():
            CenterArc((FILLET1_R, -FILLET1_R), FILLET1_R, 90, 90)
            Line((0, -FILLET1_R), (0, 0))
            Line((0, 0), (FILLET1_R, 0))
        make_face()
    extrude(amount=3, mode=Mode.SUBTRACT)
    # the kernel refuses this fillet: 1 mm, written as the material it takes off along each edge
    with BuildSketch(Plane(origin=(-8.5, 1, 24), x_dir=(1, 0, 0), z_dir=(0, -1, 0))) as fillet1_3_piece_1_section:
        Polygon((0, 0), (FILLET1_R, 0), (FILLET1_R, FILLET1_R), (0, FILLET1_R), align=None)
    fillet1_3_piece_1 = extrude(amount=FILLET1_R, mode=Mode.PRIVATE)
    fillet1_3_piece_1 = fillet1_3_piece_1 - Plane(origin=(-8.5, 1, 24), x_dir=(-0.7071067811865475, 0, -0.7071067811865475), z_dir=(0, -1, 0)) * Sphere(FILLET1_R, mode=Mode.PRIVATE)
    add(fillet1_3_piece_1, mode=Mode.SUBTRACT)
    with BuildSketch(Plane(origin=(8.5, 1, 24), x_dir=(-1, 0, 0), z_dir=(0, -1, 0))) as fillet1_3_piece_2_section:
        Polygon((0, 0), (FILLET1_R, 0), (FILLET1_R, -FILLET1_R), (0, -FILLET1_R), align=None)
    fillet1_3_piece_2 = extrude(amount=FILLET1_R, mode=Mode.PRIVATE)
    fillet1_3_piece_2 = fillet1_3_piece_2 - Plane(origin=(8.5, 1, 24), x_dir=(0.7071067811865475, 0, -0.7071067811865475), z_dir=(0, -1, 0)) * Sphere(FILLET1_R, mode=Mode.PRIVATE)
    add(fillet1_3_piece_2, mode=Mode.SUBTRACT)
    with BuildSketch(Plane(origin=(8.5, 4, 24), x_dir=(0, 1, 0), z_dir=(-1, 0, 0))) as fillet1_3_piece_3_section:
        Polygon((0, 0), (FILLET1_R, 0), (FILLET1_R, -FILLET1_R), (0, -FILLET1_R), align=None)
    fillet1_3_piece_3 = extrude(amount=FILLET1_R, mode=Mode.PRIVATE)
    fillet1_3_piece_3 = fillet1_3_piece_3 - Plane(origin=(8.5, 4, 24), x_dir=(0, -0.7071067811865475, -0.7071067811865475), z_dir=(-1, 0, 0)) * Sphere(FILLET1_R, mode=Mode.PRIVATE)
    add(fillet1_3_piece_3, mode=Mode.SUBTRACT)
    with BuildSketch(Plane(origin=(-8.5, 4, 24), x_dir=(0, 1, 0), z_dir=(1, 0, 0))) as fillet1_3_piece_4_section:
        Polygon((0, 0), (FILLET1_R, 0), (FILLET1_R, FILLET1_R), (0, FILLET1_R), align=None)
    fillet1_3_piece_4 = extrude(amount=FILLET1_R, mode=Mode.PRIVATE)
    fillet1_3_piece_4 = fillet1_3_piece_4 - Plane(origin=(-8.5, 4, 24), x_dir=(0, -0.7071067811865475, -0.7071067811865475), z_dir=(1, 0, 0)) * Sphere(FILLET1_R, mode=Mode.PRIVATE)
    add(fillet1_3_piece_4, mode=Mode.SUBTRACT)
    with BuildSketch(Plane(origin=(6.5, 5, 5), x_dir=(0, -1, 0), z_dir=(-1, 0, 0))) as fillet1_3_piece_5:
        with BuildLine():
            CenterArc((FILLET1_R, -FILLET1_R), FILLET1_R, 90, 90)
            Line((0, -FILLET1_R), (0, 0))
            Line((0, 0), (FILLET1_R, 0))
        make_face()
    extrude(amount=13, mode=Mode.SUBTRACT)
    with BuildSketch(Plane(origin=(-7.5, 5, 24), x_dir=(0, -1, 0), z_dir=(0, 0, -1)), Plane(origin=(-7.5, 0, 24), x_dir=(-1, 0, 0), z_dir=(0, 0, -1))) as fillet1_3_piece_6:
        with BuildLine():
            CenterArc((FILLET1_R, FILLET1_R), FILLET1_R, 180, 90)
            Line((0, FILLET1_R), (0, 0))
            Line((0, 0), (FILLET1_R, 0))
        make_face()
    extrude(amount=18, mode=Mode.SUBTRACT)
    with BuildSketch(Plane(origin=(7.5, 5, 24), x_dir=(0, -1, 0), z_dir=(0, 0, -1)), Plane(origin=(7.5, 0, 24), x_dir=(1, 0, 0), z_dir=(0, 0, -1))) as fillet1_3_piece_7:
        with BuildLine():
            CenterArc((FILLET1_R, -FILLET1_R), FILLET1_R, 90, 90)
            Line((0, -FILLET1_R), (0, 0))
            Line((0, 0), (FILLET1_R, 0))
        make_face()
    extrude(amount=18, mode=Mode.SUBTRACT)
    with BuildSketch(Plane(origin=(-6.5, 0, 5), x_dir=(0, 0, -1), z_dir=(1, 0, 0))) as fillet1_3_piece_8:
        with BuildLine():
            CenterArc((FILLET1_R, FILLET1_R), FILLET1_R, 180, 90)
            Line((0, FILLET1_R), (0, 0))
            Line((0, 0), (FILLET1_R, 0))
        make_face()
    extrude(amount=13, mode=Mode.SUBTRACT)
    with BuildSketch(Plane(origin=(-6.5, 0, 6), x_dir=(-1, 0, 0), z_dir=(0, 0, 1))) as fillet1_3_piece_9:
        with BuildLine():
            CenterArc((1 + FILLET1_R, -FILLET1_R), FILLET1_R, 90, 90)
            Line((1, -FILLET1_R), (1, 0))
            Line((1, 0), (1 + FILLET1_R, 0))
        make_face()
    revolve(axis=Axis((-6.5, 0, 6), (0, -1, 0)), revolution_arc=90, mode=Mode.SUBTRACT)
    with BuildSketch(Plane(origin=(6.5, 0, 6), x_dir=(0, 0, -1), z_dir=(-1, 0, 0))) as fillet1_3_piece_10:
        with BuildLine():
            CenterArc((1 + FILLET1_R, -FILLET1_R), FILLET1_R, 90, 90)
            Line((1, -FILLET1_R), (1, 0))
            Line((1, 0), (1 + FILLET1_R, 0))
        make_face()
    revolve(axis=Axis((6.5, 0, 6), (0, -1, 0)), revolution_arc=90, mode=Mode.SUBTRACT)
    with BuildSketch(Plane(origin=(6.5, 5, 6), x_dir=(0, 0, -1), z_dir=(-1, 0, 0))) as fillet1_3_piece_11:
        with BuildLine():
            CenterArc((1 + FILLET1_R, FILLET1_R), FILLET1_R, 180, 90)
            Line((1 + FILLET1_R, 0), (1, 0))
            Line((1, 0), (1, FILLET1_R))
        make_face()
    revolve(axis=Axis((6.5, 5, 6), (0, -1, 0)), revolution_arc=90, mode=Mode.SUBTRACT)
    with BuildSketch(Plane(origin=(-6.5, 5, 6), x_dir=(-1, 0, 0), z_dir=(0, 0, 1))) as fillet1_3_piece_12:
        with BuildLine():
            CenterArc((1 + FILLET1_R, FILLET1_R), FILLET1_R, 180, 90)
            Line((1 + FILLET1_R, 0), (1, 0))
            Line((1, 0), (1, FILLET1_R))
        make_face()
    revolve(axis=Axis((-6.5, 5, 6), (0, -1, 0)), revolution_arc=90, mode=Mode.SUBTRACT)


solid = part.part
